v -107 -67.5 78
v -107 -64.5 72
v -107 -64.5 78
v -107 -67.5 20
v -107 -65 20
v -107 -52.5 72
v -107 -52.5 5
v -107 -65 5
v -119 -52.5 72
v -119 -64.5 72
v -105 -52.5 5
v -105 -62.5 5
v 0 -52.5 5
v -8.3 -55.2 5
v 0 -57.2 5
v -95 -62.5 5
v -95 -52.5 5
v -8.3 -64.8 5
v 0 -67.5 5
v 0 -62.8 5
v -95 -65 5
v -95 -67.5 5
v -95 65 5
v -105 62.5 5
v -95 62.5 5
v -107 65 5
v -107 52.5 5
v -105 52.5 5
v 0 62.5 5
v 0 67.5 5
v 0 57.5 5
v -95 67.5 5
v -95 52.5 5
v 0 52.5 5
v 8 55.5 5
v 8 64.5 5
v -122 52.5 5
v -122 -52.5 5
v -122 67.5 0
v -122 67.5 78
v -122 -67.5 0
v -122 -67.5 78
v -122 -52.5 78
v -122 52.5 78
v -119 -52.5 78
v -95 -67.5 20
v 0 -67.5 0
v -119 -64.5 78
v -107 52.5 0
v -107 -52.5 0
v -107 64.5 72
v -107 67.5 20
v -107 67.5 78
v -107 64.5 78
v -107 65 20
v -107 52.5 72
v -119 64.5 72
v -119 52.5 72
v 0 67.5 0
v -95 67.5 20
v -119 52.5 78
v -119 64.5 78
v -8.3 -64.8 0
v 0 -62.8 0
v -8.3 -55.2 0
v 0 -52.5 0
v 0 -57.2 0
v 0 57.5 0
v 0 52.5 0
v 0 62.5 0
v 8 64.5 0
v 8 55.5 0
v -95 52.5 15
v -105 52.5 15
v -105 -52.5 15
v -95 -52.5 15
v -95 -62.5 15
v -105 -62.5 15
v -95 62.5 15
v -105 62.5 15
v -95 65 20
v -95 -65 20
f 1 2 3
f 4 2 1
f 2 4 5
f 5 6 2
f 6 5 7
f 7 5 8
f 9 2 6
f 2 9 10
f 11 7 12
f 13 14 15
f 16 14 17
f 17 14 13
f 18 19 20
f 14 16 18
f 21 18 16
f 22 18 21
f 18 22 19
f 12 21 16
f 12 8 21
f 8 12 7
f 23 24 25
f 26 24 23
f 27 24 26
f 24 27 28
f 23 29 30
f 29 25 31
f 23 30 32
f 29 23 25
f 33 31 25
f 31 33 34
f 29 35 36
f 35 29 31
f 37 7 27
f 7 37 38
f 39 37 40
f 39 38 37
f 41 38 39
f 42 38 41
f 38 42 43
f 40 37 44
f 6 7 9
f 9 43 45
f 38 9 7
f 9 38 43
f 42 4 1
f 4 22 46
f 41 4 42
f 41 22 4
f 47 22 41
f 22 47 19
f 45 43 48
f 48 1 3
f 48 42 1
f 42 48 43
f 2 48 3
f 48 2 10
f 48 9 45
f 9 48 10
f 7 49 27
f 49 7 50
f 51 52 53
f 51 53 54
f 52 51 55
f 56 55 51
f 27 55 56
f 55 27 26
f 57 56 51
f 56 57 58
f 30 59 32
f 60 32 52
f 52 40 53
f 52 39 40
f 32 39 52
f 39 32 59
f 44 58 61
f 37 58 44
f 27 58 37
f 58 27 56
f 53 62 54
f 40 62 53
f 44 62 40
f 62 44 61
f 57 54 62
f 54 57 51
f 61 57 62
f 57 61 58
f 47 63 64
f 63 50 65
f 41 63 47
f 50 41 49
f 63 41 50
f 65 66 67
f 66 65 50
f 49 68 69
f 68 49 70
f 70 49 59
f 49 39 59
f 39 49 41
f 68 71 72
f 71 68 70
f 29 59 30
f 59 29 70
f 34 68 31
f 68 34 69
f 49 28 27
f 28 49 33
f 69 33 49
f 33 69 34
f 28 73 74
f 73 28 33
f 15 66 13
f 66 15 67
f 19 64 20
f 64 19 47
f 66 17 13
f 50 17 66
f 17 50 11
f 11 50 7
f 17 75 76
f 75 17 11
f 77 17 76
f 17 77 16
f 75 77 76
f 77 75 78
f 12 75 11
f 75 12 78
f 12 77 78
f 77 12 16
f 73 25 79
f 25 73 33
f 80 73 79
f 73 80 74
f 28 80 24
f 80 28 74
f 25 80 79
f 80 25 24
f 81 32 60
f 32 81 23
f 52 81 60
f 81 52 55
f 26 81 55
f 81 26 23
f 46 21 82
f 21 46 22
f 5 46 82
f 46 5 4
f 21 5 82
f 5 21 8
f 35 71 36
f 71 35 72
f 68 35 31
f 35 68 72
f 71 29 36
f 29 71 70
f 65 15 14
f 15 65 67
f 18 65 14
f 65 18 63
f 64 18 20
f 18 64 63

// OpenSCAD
// file: ../../lib/common.scad
// Shared modules used across models.
// Include with: use <../../lib/common.scad>

$fn = $preview ? 32 : 96;

EPS = 0.01;

module rounded_box(size, radius) {
    minkowski() {
        cube([size.x - 2*radius, size.y - 2*radius, size.z - 2*radius], center = true);
        sphere(r = radius);
    }
}

module shell(outer_size, wall) {
    difference() {
        cube(outer_size, center = true);
        cube([outer_size.x - 2*wall, outer_size.y - 2*wall, outer_size.z + EPS], center = true);
    }
}

module pipe(h, outer_r, wall) {
    difference() {
        cylinder(h = h, r = outer_r);
        translate([0, 0, -EPS])
            cylinder(h = h + 2*EPS, r = outer_r - wall);
    }
}

module mounting_holes(spacing, hole_d, depth) {
    for (x = [-1, 1], y = [-1, 1])
        translate([x * spacing/2, y * spacing/2, 0])
            cylinder(h = depth, d = hole_d, center = true);
}

// Countersunk screw hole (M3 default). Punch through with difference().
module countersunk_hole(shaft_d = 3.2, head_d = 6, head_depth = 1.8, length = 20) {
    translate([0, 0, -EPS])
        cylinder(h = length, d = shaft_d);
    translate([0, 0, -EPS])
        cylinder(h = head_depth, d1 = head_d, d2 = shaft_d);
}
// main file
use <../../lib/common.scad>

/* [Router (rectangular bottom)] */
router_length = 231;          // long side
router_width  = 125;          // short side

/* [Switch (rectangular cuboid)] */
switch_length = 210;
switch_width  = 125;
switch_height = 27;

/* [Vertical layout (mm)] */
floor_thickness  = 5;         // floor rail thickness
switch_gap_below = 10;        // cable space + airflow under switch
airflow_gap      = 30;        // gap between switch top and router bottom

/* [Floor rails] */
rail_width = 15;              // wide enough that switch posts sit fully on rails

/* [Router corner L-cups (full wrap, catches corners)] */
post_size      = 15;
wall_height    = 6;           // short enough to clear the router's slanted sides
wall_thickness = 3;

/* [Switch elevation posts (flat top, no walls)] */
switch_post_size = 10;

/* [Switch retention tabs (on long rails, light retention only)] */
tab_x_length  = 20;
tab_thickness = 2.5;
tab_height    = 15;           // above the rail (covers switch bottom 10 mm)

/* [Half-to-half dovetail joint] */
dt_base_w       = 5;          // Y width at the seam (narrow base)
dt_tip_w        = 9;          // Y width at the tip (wide, locks the halves)
dt_length       = 8;          // X extent of the tenon
dt_offset       = rail_width / 2;  // centerline of dovetail = centerline of rail
joint_clearance = 0.3;        // mortise is wider by 2× this on every face

/* [Tolerance] */
clearance = 2;                // gap between part walls and devices

/* [Output mode] */
output = "half";              // "half" | "full" | "assembly"

router_post_h = floor_thickness + switch_gap_below + switch_height + airflow_gap;
switch_post_h = floor_thickness + switch_gap_below;

s_half_l = switch_length / 2;
s_half_w = switch_width  / 2;

// Frame half-dimensions. X is sized by whichever needs more room:
//   - router L-cup wall outer face (router corner + clearance + wall_thickness), OR
//   - switch X clearance to router-post inner face (switch corner + clearance + post_size)
half_l = max(router_length / 2 + clearance + wall_thickness,
             s_half_l       + clearance + post_size);
half_w = router_width  / 2 + clearance + wall_thickness;

EPS = 0.01;

// L-cup post: leg + 2 walls at the corner indicated by (cx, cy).
module corner_post(size, h, wall_t, wall_h, cx, cy) {
    cube([size, size, h]);
    wx = cx > 0 ? size - wall_t : 0;
    wy = cy > 0 ? size - wall_t : 0;
    translate([0, wy, h])
        cube([size, wall_t, wall_h]);
    translate([wx, 0, h])
        cube([wall_t, size, wall_h]);
}

// 2D dovetail tenon: narrow at X=0 (base), wide at X=length (tip).
module dovetail_2d(base_w, tip_w, length) {
    polygon([
        [0,      -base_w/2],
        [length, -tip_w/2],
        [length, +tip_w/2],
        [0,      +base_w/2]
    ]);
}

// LEFT HALF — print 2 copies, rotate one 180° about Z.
// The dovetail joints (top rail tenon, bottom rail mortise — and vice versa
// after rotation) lock the halves so they can't pull apart sideways. Assemble
// by lowering one half straight down onto the other from above.
module stand_half() {
    leg_h_router = router_post_h - floor_thickness;
    leg_h_switch = switch_post_h - floor_thickness;

    difference() {
        union() {
            // ---- FLOOR RAILS (U-shape, open at split line x=0) ----
            translate([-half_l, -half_w, 0])
                cube([rail_width, 2*half_w, floor_thickness]);              // side (closed end of U)
            translate([-half_l, half_w - rail_width, 0])
                cube([half_l, rail_width, floor_thickness]);                // top arm of U
            translate([-half_l, -half_w, 0])
                cube([half_l, rail_width, floor_thickness]);                // bottom arm of U

            // ---- ROUTER CORNER POSTS (2 per half) — full L-cups ----
            translate([-half_l, -half_w, floor_thickness])
                corner_post(post_size, leg_h_router, wall_thickness, wall_height, -1, -1);
            translate([-half_l, half_w - post_size, floor_thickness])
                corner_post(post_size, leg_h_router, wall_thickness, wall_height, -1, +1);

            // ---- SWITCH ELEVATION POSTS (2 per half) — flat tops, no walls ----
            translate([-s_half_l, -s_half_w, floor_thickness])
                cube([switch_post_size, switch_post_size, leg_h_switch]);
            translate([-s_half_l, s_half_w - switch_post_size, floor_thickness])
                cube([switch_post_size, switch_post_size, leg_h_switch]);

            // ---- SWITCH RETENTION TABS (on long rails, at the switch corner X) ----
            translate([-s_half_l - tab_x_length/2, half_w - tab_thickness, floor_thickness])
                cube([tab_x_length, tab_thickness, tab_height]);
            translate([-s_half_l - tab_x_length/2, -half_w, floor_thickness])
                cube([tab_x_length, tab_thickness, tab_height]);

            // ---- DOVETAIL TENON on top rail (sticks out in +X past x=0) ----
            translate([0, half_w - dt_offset, 0])
                linear_extrude(floor_thickness)
                    dovetail_2d(dt_base_w, dt_tip_w, dt_length);
        }

        // ---- DOVETAIL MORTISE on bottom rail (cutout, opens at x=0 going -X) ----
        translate([0, -(half_w - dt_offset), -EPS])
            linear_extrude(floor_thickness + 2*EPS)
                mirror([1, 0, 0])
                    dovetail_2d(dt_base_w  + 2*joint_clearance,
                                dt_tip_w   + 2*joint_clearance,
                                dt_length  + joint_clearance);
    }
}

module stand_full() {
    stand_half();
    rotate([0, 0, 180]) stand_half();
}

module assembly_preview() {
    // Ghost router (height ~50 mm — actual height doesn't affect the stand design)
    %translate([0, 0, router_post_h + 50/2])
        cube([router_length, router_width, 50], center = true);
    %translate([0, 0, switch_post_h + switch_height/2])
        cube([switch_length, switch_width, switch_height], center = true);

    stand_full();
}

if (output == "assembly")   assembly_preview();
else if (output == "full")  stand_full();
else                        stand_half();
